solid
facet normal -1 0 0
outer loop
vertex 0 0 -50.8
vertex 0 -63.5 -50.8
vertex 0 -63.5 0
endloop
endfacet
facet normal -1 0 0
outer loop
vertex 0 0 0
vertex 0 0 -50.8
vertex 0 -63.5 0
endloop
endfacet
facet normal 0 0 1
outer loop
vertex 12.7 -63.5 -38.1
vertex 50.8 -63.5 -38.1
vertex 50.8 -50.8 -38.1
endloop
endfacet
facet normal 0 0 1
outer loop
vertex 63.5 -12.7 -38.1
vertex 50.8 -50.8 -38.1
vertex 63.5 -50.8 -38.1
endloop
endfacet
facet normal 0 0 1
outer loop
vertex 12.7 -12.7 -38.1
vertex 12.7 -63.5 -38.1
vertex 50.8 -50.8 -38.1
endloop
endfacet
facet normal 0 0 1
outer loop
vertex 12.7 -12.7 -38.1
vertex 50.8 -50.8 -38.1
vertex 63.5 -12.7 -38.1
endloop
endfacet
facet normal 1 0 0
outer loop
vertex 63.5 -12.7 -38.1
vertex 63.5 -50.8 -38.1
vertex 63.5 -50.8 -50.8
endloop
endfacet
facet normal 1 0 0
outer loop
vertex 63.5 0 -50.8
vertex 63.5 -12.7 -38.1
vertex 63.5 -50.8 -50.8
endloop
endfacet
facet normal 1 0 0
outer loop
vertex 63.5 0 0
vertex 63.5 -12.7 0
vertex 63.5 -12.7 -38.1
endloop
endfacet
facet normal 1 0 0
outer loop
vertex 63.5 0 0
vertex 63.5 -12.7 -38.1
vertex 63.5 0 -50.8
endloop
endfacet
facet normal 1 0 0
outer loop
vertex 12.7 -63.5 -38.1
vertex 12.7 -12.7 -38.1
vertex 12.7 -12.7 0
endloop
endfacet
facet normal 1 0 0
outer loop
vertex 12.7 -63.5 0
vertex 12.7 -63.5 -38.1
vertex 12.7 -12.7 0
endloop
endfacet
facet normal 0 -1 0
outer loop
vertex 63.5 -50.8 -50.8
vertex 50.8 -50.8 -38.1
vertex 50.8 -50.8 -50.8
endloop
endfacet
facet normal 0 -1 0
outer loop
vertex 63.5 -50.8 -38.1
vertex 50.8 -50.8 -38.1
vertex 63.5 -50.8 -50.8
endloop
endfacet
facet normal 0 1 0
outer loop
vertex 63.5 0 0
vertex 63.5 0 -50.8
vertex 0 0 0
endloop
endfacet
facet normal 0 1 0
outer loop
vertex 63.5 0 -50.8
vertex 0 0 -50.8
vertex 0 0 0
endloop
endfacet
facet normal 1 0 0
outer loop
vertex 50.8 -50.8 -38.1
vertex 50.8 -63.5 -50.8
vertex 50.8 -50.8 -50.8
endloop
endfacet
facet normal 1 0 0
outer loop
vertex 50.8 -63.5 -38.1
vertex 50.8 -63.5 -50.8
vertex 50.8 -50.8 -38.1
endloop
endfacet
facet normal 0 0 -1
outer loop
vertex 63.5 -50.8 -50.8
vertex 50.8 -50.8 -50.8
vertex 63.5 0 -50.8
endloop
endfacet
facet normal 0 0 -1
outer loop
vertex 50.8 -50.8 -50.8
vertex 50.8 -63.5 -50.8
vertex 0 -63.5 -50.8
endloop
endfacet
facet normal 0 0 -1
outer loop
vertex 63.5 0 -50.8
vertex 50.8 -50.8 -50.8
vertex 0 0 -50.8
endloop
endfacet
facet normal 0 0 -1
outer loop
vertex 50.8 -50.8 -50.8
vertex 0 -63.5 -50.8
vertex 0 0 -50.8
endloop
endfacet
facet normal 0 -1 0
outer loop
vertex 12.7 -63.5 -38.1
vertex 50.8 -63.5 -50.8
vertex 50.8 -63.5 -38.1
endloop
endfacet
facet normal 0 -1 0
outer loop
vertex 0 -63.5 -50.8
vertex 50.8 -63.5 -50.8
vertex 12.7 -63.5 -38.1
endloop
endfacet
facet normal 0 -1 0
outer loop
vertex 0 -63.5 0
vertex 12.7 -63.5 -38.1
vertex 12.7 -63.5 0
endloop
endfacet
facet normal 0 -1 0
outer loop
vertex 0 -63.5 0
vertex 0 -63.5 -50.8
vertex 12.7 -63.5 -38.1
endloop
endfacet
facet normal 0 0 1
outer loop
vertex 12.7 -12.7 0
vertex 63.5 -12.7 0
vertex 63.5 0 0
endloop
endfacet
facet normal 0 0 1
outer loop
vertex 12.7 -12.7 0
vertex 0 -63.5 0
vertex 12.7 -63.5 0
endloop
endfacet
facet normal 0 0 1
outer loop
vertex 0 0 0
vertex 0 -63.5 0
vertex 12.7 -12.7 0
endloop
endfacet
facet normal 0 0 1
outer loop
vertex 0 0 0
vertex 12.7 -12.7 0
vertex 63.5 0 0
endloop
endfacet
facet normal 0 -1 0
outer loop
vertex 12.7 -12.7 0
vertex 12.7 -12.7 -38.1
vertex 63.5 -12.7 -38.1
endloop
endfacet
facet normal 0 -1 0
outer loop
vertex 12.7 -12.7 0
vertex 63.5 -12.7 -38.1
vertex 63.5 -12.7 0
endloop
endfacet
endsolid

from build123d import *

# Parameters (mm, degrees)
F0_W     = 12.7
F0_H     = 50.8
F1_DEPTH = 63.5
F2_W     = 12.7
F2_H     = 50.8
F3_DEPTH = 50.8
F4_W     = 50.8
F4_H     = 12.7
F5_DEPTH = 50.8
F6_W     = 12.7
F6_H     = 12.7
F7_DEPTH = 12.7


with BuildPart() as f1:
    # F0 (on Front) → F1 (new body)
    with BuildSketch(Plane.XZ):
        with Locations((6.35, -25.4)):
            Rectangle(F0_W, F0_H)
    extrude(amount=F1_DEPTH)

    # F2 (on face) → F3 (join)
    with BuildSketch(Plane.YZ.offset(12.7)):
        with Locations((-6.35, -25.4)):
            Rectangle(F2_W, F2_H)
    extrude(amount=F3_DEPTH)

    # F4 (on face) → F5 (join)
    with BuildSketch(Plane.YZ.offset(12.7)):
        with Locations((-38.1, -44.45)):
            Rectangle(F4_W, F4_H)
    extrude(amount=F5_DEPTH)

    # F6 (on face) → F7 (cut)
    with BuildSketch(Plane.XZ.offset(63.5)):
        with Locations((57.15, -44.45)):
            Rectangle(F6_W, F6_H)
    extrude(amount=-F7_DEPTH, mode=Mode.SUBTRACT)


solid = f1.part
